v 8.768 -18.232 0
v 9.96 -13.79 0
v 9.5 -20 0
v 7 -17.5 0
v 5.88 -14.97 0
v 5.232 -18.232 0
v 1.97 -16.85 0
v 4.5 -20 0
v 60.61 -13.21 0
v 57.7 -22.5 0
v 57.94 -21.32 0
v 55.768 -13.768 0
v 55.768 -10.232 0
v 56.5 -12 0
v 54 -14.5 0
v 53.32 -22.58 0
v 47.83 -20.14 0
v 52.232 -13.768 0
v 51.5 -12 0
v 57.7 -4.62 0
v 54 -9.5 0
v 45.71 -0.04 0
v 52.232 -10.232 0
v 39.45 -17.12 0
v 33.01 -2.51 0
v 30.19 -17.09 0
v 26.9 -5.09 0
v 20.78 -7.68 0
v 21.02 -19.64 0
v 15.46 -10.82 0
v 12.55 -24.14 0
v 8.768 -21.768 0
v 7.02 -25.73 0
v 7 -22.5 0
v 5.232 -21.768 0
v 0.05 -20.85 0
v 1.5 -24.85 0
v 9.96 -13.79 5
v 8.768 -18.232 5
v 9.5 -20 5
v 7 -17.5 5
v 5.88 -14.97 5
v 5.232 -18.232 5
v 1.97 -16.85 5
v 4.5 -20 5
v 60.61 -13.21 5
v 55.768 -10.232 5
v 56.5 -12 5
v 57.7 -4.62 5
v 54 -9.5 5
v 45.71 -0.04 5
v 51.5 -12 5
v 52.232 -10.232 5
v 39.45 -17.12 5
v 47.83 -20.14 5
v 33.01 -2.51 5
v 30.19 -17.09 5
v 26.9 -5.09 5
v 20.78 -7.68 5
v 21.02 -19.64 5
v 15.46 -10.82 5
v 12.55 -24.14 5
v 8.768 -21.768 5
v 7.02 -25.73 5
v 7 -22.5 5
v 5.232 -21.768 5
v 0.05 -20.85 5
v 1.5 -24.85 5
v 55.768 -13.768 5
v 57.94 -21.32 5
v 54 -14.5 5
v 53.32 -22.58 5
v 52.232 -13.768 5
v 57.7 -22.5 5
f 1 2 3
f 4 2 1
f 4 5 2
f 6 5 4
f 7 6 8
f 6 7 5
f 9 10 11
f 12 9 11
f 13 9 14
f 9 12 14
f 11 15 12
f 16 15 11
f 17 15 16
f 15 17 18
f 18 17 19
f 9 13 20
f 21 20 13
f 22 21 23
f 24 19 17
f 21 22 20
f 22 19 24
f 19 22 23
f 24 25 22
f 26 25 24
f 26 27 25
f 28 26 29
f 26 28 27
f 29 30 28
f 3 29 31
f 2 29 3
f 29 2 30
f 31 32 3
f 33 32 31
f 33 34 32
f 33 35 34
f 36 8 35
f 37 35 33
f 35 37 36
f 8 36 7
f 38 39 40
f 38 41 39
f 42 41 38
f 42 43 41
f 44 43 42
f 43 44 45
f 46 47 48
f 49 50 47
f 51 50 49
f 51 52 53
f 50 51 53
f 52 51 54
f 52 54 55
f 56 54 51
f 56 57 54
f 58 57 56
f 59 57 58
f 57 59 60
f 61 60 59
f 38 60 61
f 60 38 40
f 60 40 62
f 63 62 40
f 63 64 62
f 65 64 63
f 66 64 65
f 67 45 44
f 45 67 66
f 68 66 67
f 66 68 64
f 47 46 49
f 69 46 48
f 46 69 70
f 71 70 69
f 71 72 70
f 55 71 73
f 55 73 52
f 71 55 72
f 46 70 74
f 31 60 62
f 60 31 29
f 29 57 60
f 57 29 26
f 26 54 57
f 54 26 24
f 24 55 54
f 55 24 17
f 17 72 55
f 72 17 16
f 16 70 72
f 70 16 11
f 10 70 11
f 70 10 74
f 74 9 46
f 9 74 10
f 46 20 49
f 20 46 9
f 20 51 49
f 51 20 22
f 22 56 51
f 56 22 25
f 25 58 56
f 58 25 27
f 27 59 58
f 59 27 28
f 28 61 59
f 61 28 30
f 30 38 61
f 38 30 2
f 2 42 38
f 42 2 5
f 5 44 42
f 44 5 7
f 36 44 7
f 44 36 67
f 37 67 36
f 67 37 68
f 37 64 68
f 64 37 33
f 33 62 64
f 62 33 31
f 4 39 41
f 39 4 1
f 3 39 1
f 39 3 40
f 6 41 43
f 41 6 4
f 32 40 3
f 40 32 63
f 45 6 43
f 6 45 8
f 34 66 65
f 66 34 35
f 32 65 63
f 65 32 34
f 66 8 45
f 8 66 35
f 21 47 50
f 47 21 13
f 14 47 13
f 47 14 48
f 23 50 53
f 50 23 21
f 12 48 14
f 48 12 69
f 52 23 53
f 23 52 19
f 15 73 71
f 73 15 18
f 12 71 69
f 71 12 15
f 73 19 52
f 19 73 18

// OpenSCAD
difference(){
linear_extrude(height = 5, center = false) {

polygon(points=[[57.7,-22.5],[60.61,-13.21],[57.7,-4.62],[45.71,-0.04],[33.01,-2.51],[26.9,-5.09],[20.78,-7.68],[15.46,-10.82],[9.96,-13.79],[5.88,-14.97],[1.97,-16.85],[0.05,-20.85],[1.5,-24.85],[7.02,-25.73],[12.55,-24.14],[21.02,-19.64],[30.19,-17.09],[39.45,-17.12],[47.83,-20.14],[53.32,-22.58],[57.94,-21.32]]);

}

translate([7,-20,-2]) cylinder(h=8, r=2.5);
translate([54,-12,-2]) cylinder(h=8, r=2.5);
}
